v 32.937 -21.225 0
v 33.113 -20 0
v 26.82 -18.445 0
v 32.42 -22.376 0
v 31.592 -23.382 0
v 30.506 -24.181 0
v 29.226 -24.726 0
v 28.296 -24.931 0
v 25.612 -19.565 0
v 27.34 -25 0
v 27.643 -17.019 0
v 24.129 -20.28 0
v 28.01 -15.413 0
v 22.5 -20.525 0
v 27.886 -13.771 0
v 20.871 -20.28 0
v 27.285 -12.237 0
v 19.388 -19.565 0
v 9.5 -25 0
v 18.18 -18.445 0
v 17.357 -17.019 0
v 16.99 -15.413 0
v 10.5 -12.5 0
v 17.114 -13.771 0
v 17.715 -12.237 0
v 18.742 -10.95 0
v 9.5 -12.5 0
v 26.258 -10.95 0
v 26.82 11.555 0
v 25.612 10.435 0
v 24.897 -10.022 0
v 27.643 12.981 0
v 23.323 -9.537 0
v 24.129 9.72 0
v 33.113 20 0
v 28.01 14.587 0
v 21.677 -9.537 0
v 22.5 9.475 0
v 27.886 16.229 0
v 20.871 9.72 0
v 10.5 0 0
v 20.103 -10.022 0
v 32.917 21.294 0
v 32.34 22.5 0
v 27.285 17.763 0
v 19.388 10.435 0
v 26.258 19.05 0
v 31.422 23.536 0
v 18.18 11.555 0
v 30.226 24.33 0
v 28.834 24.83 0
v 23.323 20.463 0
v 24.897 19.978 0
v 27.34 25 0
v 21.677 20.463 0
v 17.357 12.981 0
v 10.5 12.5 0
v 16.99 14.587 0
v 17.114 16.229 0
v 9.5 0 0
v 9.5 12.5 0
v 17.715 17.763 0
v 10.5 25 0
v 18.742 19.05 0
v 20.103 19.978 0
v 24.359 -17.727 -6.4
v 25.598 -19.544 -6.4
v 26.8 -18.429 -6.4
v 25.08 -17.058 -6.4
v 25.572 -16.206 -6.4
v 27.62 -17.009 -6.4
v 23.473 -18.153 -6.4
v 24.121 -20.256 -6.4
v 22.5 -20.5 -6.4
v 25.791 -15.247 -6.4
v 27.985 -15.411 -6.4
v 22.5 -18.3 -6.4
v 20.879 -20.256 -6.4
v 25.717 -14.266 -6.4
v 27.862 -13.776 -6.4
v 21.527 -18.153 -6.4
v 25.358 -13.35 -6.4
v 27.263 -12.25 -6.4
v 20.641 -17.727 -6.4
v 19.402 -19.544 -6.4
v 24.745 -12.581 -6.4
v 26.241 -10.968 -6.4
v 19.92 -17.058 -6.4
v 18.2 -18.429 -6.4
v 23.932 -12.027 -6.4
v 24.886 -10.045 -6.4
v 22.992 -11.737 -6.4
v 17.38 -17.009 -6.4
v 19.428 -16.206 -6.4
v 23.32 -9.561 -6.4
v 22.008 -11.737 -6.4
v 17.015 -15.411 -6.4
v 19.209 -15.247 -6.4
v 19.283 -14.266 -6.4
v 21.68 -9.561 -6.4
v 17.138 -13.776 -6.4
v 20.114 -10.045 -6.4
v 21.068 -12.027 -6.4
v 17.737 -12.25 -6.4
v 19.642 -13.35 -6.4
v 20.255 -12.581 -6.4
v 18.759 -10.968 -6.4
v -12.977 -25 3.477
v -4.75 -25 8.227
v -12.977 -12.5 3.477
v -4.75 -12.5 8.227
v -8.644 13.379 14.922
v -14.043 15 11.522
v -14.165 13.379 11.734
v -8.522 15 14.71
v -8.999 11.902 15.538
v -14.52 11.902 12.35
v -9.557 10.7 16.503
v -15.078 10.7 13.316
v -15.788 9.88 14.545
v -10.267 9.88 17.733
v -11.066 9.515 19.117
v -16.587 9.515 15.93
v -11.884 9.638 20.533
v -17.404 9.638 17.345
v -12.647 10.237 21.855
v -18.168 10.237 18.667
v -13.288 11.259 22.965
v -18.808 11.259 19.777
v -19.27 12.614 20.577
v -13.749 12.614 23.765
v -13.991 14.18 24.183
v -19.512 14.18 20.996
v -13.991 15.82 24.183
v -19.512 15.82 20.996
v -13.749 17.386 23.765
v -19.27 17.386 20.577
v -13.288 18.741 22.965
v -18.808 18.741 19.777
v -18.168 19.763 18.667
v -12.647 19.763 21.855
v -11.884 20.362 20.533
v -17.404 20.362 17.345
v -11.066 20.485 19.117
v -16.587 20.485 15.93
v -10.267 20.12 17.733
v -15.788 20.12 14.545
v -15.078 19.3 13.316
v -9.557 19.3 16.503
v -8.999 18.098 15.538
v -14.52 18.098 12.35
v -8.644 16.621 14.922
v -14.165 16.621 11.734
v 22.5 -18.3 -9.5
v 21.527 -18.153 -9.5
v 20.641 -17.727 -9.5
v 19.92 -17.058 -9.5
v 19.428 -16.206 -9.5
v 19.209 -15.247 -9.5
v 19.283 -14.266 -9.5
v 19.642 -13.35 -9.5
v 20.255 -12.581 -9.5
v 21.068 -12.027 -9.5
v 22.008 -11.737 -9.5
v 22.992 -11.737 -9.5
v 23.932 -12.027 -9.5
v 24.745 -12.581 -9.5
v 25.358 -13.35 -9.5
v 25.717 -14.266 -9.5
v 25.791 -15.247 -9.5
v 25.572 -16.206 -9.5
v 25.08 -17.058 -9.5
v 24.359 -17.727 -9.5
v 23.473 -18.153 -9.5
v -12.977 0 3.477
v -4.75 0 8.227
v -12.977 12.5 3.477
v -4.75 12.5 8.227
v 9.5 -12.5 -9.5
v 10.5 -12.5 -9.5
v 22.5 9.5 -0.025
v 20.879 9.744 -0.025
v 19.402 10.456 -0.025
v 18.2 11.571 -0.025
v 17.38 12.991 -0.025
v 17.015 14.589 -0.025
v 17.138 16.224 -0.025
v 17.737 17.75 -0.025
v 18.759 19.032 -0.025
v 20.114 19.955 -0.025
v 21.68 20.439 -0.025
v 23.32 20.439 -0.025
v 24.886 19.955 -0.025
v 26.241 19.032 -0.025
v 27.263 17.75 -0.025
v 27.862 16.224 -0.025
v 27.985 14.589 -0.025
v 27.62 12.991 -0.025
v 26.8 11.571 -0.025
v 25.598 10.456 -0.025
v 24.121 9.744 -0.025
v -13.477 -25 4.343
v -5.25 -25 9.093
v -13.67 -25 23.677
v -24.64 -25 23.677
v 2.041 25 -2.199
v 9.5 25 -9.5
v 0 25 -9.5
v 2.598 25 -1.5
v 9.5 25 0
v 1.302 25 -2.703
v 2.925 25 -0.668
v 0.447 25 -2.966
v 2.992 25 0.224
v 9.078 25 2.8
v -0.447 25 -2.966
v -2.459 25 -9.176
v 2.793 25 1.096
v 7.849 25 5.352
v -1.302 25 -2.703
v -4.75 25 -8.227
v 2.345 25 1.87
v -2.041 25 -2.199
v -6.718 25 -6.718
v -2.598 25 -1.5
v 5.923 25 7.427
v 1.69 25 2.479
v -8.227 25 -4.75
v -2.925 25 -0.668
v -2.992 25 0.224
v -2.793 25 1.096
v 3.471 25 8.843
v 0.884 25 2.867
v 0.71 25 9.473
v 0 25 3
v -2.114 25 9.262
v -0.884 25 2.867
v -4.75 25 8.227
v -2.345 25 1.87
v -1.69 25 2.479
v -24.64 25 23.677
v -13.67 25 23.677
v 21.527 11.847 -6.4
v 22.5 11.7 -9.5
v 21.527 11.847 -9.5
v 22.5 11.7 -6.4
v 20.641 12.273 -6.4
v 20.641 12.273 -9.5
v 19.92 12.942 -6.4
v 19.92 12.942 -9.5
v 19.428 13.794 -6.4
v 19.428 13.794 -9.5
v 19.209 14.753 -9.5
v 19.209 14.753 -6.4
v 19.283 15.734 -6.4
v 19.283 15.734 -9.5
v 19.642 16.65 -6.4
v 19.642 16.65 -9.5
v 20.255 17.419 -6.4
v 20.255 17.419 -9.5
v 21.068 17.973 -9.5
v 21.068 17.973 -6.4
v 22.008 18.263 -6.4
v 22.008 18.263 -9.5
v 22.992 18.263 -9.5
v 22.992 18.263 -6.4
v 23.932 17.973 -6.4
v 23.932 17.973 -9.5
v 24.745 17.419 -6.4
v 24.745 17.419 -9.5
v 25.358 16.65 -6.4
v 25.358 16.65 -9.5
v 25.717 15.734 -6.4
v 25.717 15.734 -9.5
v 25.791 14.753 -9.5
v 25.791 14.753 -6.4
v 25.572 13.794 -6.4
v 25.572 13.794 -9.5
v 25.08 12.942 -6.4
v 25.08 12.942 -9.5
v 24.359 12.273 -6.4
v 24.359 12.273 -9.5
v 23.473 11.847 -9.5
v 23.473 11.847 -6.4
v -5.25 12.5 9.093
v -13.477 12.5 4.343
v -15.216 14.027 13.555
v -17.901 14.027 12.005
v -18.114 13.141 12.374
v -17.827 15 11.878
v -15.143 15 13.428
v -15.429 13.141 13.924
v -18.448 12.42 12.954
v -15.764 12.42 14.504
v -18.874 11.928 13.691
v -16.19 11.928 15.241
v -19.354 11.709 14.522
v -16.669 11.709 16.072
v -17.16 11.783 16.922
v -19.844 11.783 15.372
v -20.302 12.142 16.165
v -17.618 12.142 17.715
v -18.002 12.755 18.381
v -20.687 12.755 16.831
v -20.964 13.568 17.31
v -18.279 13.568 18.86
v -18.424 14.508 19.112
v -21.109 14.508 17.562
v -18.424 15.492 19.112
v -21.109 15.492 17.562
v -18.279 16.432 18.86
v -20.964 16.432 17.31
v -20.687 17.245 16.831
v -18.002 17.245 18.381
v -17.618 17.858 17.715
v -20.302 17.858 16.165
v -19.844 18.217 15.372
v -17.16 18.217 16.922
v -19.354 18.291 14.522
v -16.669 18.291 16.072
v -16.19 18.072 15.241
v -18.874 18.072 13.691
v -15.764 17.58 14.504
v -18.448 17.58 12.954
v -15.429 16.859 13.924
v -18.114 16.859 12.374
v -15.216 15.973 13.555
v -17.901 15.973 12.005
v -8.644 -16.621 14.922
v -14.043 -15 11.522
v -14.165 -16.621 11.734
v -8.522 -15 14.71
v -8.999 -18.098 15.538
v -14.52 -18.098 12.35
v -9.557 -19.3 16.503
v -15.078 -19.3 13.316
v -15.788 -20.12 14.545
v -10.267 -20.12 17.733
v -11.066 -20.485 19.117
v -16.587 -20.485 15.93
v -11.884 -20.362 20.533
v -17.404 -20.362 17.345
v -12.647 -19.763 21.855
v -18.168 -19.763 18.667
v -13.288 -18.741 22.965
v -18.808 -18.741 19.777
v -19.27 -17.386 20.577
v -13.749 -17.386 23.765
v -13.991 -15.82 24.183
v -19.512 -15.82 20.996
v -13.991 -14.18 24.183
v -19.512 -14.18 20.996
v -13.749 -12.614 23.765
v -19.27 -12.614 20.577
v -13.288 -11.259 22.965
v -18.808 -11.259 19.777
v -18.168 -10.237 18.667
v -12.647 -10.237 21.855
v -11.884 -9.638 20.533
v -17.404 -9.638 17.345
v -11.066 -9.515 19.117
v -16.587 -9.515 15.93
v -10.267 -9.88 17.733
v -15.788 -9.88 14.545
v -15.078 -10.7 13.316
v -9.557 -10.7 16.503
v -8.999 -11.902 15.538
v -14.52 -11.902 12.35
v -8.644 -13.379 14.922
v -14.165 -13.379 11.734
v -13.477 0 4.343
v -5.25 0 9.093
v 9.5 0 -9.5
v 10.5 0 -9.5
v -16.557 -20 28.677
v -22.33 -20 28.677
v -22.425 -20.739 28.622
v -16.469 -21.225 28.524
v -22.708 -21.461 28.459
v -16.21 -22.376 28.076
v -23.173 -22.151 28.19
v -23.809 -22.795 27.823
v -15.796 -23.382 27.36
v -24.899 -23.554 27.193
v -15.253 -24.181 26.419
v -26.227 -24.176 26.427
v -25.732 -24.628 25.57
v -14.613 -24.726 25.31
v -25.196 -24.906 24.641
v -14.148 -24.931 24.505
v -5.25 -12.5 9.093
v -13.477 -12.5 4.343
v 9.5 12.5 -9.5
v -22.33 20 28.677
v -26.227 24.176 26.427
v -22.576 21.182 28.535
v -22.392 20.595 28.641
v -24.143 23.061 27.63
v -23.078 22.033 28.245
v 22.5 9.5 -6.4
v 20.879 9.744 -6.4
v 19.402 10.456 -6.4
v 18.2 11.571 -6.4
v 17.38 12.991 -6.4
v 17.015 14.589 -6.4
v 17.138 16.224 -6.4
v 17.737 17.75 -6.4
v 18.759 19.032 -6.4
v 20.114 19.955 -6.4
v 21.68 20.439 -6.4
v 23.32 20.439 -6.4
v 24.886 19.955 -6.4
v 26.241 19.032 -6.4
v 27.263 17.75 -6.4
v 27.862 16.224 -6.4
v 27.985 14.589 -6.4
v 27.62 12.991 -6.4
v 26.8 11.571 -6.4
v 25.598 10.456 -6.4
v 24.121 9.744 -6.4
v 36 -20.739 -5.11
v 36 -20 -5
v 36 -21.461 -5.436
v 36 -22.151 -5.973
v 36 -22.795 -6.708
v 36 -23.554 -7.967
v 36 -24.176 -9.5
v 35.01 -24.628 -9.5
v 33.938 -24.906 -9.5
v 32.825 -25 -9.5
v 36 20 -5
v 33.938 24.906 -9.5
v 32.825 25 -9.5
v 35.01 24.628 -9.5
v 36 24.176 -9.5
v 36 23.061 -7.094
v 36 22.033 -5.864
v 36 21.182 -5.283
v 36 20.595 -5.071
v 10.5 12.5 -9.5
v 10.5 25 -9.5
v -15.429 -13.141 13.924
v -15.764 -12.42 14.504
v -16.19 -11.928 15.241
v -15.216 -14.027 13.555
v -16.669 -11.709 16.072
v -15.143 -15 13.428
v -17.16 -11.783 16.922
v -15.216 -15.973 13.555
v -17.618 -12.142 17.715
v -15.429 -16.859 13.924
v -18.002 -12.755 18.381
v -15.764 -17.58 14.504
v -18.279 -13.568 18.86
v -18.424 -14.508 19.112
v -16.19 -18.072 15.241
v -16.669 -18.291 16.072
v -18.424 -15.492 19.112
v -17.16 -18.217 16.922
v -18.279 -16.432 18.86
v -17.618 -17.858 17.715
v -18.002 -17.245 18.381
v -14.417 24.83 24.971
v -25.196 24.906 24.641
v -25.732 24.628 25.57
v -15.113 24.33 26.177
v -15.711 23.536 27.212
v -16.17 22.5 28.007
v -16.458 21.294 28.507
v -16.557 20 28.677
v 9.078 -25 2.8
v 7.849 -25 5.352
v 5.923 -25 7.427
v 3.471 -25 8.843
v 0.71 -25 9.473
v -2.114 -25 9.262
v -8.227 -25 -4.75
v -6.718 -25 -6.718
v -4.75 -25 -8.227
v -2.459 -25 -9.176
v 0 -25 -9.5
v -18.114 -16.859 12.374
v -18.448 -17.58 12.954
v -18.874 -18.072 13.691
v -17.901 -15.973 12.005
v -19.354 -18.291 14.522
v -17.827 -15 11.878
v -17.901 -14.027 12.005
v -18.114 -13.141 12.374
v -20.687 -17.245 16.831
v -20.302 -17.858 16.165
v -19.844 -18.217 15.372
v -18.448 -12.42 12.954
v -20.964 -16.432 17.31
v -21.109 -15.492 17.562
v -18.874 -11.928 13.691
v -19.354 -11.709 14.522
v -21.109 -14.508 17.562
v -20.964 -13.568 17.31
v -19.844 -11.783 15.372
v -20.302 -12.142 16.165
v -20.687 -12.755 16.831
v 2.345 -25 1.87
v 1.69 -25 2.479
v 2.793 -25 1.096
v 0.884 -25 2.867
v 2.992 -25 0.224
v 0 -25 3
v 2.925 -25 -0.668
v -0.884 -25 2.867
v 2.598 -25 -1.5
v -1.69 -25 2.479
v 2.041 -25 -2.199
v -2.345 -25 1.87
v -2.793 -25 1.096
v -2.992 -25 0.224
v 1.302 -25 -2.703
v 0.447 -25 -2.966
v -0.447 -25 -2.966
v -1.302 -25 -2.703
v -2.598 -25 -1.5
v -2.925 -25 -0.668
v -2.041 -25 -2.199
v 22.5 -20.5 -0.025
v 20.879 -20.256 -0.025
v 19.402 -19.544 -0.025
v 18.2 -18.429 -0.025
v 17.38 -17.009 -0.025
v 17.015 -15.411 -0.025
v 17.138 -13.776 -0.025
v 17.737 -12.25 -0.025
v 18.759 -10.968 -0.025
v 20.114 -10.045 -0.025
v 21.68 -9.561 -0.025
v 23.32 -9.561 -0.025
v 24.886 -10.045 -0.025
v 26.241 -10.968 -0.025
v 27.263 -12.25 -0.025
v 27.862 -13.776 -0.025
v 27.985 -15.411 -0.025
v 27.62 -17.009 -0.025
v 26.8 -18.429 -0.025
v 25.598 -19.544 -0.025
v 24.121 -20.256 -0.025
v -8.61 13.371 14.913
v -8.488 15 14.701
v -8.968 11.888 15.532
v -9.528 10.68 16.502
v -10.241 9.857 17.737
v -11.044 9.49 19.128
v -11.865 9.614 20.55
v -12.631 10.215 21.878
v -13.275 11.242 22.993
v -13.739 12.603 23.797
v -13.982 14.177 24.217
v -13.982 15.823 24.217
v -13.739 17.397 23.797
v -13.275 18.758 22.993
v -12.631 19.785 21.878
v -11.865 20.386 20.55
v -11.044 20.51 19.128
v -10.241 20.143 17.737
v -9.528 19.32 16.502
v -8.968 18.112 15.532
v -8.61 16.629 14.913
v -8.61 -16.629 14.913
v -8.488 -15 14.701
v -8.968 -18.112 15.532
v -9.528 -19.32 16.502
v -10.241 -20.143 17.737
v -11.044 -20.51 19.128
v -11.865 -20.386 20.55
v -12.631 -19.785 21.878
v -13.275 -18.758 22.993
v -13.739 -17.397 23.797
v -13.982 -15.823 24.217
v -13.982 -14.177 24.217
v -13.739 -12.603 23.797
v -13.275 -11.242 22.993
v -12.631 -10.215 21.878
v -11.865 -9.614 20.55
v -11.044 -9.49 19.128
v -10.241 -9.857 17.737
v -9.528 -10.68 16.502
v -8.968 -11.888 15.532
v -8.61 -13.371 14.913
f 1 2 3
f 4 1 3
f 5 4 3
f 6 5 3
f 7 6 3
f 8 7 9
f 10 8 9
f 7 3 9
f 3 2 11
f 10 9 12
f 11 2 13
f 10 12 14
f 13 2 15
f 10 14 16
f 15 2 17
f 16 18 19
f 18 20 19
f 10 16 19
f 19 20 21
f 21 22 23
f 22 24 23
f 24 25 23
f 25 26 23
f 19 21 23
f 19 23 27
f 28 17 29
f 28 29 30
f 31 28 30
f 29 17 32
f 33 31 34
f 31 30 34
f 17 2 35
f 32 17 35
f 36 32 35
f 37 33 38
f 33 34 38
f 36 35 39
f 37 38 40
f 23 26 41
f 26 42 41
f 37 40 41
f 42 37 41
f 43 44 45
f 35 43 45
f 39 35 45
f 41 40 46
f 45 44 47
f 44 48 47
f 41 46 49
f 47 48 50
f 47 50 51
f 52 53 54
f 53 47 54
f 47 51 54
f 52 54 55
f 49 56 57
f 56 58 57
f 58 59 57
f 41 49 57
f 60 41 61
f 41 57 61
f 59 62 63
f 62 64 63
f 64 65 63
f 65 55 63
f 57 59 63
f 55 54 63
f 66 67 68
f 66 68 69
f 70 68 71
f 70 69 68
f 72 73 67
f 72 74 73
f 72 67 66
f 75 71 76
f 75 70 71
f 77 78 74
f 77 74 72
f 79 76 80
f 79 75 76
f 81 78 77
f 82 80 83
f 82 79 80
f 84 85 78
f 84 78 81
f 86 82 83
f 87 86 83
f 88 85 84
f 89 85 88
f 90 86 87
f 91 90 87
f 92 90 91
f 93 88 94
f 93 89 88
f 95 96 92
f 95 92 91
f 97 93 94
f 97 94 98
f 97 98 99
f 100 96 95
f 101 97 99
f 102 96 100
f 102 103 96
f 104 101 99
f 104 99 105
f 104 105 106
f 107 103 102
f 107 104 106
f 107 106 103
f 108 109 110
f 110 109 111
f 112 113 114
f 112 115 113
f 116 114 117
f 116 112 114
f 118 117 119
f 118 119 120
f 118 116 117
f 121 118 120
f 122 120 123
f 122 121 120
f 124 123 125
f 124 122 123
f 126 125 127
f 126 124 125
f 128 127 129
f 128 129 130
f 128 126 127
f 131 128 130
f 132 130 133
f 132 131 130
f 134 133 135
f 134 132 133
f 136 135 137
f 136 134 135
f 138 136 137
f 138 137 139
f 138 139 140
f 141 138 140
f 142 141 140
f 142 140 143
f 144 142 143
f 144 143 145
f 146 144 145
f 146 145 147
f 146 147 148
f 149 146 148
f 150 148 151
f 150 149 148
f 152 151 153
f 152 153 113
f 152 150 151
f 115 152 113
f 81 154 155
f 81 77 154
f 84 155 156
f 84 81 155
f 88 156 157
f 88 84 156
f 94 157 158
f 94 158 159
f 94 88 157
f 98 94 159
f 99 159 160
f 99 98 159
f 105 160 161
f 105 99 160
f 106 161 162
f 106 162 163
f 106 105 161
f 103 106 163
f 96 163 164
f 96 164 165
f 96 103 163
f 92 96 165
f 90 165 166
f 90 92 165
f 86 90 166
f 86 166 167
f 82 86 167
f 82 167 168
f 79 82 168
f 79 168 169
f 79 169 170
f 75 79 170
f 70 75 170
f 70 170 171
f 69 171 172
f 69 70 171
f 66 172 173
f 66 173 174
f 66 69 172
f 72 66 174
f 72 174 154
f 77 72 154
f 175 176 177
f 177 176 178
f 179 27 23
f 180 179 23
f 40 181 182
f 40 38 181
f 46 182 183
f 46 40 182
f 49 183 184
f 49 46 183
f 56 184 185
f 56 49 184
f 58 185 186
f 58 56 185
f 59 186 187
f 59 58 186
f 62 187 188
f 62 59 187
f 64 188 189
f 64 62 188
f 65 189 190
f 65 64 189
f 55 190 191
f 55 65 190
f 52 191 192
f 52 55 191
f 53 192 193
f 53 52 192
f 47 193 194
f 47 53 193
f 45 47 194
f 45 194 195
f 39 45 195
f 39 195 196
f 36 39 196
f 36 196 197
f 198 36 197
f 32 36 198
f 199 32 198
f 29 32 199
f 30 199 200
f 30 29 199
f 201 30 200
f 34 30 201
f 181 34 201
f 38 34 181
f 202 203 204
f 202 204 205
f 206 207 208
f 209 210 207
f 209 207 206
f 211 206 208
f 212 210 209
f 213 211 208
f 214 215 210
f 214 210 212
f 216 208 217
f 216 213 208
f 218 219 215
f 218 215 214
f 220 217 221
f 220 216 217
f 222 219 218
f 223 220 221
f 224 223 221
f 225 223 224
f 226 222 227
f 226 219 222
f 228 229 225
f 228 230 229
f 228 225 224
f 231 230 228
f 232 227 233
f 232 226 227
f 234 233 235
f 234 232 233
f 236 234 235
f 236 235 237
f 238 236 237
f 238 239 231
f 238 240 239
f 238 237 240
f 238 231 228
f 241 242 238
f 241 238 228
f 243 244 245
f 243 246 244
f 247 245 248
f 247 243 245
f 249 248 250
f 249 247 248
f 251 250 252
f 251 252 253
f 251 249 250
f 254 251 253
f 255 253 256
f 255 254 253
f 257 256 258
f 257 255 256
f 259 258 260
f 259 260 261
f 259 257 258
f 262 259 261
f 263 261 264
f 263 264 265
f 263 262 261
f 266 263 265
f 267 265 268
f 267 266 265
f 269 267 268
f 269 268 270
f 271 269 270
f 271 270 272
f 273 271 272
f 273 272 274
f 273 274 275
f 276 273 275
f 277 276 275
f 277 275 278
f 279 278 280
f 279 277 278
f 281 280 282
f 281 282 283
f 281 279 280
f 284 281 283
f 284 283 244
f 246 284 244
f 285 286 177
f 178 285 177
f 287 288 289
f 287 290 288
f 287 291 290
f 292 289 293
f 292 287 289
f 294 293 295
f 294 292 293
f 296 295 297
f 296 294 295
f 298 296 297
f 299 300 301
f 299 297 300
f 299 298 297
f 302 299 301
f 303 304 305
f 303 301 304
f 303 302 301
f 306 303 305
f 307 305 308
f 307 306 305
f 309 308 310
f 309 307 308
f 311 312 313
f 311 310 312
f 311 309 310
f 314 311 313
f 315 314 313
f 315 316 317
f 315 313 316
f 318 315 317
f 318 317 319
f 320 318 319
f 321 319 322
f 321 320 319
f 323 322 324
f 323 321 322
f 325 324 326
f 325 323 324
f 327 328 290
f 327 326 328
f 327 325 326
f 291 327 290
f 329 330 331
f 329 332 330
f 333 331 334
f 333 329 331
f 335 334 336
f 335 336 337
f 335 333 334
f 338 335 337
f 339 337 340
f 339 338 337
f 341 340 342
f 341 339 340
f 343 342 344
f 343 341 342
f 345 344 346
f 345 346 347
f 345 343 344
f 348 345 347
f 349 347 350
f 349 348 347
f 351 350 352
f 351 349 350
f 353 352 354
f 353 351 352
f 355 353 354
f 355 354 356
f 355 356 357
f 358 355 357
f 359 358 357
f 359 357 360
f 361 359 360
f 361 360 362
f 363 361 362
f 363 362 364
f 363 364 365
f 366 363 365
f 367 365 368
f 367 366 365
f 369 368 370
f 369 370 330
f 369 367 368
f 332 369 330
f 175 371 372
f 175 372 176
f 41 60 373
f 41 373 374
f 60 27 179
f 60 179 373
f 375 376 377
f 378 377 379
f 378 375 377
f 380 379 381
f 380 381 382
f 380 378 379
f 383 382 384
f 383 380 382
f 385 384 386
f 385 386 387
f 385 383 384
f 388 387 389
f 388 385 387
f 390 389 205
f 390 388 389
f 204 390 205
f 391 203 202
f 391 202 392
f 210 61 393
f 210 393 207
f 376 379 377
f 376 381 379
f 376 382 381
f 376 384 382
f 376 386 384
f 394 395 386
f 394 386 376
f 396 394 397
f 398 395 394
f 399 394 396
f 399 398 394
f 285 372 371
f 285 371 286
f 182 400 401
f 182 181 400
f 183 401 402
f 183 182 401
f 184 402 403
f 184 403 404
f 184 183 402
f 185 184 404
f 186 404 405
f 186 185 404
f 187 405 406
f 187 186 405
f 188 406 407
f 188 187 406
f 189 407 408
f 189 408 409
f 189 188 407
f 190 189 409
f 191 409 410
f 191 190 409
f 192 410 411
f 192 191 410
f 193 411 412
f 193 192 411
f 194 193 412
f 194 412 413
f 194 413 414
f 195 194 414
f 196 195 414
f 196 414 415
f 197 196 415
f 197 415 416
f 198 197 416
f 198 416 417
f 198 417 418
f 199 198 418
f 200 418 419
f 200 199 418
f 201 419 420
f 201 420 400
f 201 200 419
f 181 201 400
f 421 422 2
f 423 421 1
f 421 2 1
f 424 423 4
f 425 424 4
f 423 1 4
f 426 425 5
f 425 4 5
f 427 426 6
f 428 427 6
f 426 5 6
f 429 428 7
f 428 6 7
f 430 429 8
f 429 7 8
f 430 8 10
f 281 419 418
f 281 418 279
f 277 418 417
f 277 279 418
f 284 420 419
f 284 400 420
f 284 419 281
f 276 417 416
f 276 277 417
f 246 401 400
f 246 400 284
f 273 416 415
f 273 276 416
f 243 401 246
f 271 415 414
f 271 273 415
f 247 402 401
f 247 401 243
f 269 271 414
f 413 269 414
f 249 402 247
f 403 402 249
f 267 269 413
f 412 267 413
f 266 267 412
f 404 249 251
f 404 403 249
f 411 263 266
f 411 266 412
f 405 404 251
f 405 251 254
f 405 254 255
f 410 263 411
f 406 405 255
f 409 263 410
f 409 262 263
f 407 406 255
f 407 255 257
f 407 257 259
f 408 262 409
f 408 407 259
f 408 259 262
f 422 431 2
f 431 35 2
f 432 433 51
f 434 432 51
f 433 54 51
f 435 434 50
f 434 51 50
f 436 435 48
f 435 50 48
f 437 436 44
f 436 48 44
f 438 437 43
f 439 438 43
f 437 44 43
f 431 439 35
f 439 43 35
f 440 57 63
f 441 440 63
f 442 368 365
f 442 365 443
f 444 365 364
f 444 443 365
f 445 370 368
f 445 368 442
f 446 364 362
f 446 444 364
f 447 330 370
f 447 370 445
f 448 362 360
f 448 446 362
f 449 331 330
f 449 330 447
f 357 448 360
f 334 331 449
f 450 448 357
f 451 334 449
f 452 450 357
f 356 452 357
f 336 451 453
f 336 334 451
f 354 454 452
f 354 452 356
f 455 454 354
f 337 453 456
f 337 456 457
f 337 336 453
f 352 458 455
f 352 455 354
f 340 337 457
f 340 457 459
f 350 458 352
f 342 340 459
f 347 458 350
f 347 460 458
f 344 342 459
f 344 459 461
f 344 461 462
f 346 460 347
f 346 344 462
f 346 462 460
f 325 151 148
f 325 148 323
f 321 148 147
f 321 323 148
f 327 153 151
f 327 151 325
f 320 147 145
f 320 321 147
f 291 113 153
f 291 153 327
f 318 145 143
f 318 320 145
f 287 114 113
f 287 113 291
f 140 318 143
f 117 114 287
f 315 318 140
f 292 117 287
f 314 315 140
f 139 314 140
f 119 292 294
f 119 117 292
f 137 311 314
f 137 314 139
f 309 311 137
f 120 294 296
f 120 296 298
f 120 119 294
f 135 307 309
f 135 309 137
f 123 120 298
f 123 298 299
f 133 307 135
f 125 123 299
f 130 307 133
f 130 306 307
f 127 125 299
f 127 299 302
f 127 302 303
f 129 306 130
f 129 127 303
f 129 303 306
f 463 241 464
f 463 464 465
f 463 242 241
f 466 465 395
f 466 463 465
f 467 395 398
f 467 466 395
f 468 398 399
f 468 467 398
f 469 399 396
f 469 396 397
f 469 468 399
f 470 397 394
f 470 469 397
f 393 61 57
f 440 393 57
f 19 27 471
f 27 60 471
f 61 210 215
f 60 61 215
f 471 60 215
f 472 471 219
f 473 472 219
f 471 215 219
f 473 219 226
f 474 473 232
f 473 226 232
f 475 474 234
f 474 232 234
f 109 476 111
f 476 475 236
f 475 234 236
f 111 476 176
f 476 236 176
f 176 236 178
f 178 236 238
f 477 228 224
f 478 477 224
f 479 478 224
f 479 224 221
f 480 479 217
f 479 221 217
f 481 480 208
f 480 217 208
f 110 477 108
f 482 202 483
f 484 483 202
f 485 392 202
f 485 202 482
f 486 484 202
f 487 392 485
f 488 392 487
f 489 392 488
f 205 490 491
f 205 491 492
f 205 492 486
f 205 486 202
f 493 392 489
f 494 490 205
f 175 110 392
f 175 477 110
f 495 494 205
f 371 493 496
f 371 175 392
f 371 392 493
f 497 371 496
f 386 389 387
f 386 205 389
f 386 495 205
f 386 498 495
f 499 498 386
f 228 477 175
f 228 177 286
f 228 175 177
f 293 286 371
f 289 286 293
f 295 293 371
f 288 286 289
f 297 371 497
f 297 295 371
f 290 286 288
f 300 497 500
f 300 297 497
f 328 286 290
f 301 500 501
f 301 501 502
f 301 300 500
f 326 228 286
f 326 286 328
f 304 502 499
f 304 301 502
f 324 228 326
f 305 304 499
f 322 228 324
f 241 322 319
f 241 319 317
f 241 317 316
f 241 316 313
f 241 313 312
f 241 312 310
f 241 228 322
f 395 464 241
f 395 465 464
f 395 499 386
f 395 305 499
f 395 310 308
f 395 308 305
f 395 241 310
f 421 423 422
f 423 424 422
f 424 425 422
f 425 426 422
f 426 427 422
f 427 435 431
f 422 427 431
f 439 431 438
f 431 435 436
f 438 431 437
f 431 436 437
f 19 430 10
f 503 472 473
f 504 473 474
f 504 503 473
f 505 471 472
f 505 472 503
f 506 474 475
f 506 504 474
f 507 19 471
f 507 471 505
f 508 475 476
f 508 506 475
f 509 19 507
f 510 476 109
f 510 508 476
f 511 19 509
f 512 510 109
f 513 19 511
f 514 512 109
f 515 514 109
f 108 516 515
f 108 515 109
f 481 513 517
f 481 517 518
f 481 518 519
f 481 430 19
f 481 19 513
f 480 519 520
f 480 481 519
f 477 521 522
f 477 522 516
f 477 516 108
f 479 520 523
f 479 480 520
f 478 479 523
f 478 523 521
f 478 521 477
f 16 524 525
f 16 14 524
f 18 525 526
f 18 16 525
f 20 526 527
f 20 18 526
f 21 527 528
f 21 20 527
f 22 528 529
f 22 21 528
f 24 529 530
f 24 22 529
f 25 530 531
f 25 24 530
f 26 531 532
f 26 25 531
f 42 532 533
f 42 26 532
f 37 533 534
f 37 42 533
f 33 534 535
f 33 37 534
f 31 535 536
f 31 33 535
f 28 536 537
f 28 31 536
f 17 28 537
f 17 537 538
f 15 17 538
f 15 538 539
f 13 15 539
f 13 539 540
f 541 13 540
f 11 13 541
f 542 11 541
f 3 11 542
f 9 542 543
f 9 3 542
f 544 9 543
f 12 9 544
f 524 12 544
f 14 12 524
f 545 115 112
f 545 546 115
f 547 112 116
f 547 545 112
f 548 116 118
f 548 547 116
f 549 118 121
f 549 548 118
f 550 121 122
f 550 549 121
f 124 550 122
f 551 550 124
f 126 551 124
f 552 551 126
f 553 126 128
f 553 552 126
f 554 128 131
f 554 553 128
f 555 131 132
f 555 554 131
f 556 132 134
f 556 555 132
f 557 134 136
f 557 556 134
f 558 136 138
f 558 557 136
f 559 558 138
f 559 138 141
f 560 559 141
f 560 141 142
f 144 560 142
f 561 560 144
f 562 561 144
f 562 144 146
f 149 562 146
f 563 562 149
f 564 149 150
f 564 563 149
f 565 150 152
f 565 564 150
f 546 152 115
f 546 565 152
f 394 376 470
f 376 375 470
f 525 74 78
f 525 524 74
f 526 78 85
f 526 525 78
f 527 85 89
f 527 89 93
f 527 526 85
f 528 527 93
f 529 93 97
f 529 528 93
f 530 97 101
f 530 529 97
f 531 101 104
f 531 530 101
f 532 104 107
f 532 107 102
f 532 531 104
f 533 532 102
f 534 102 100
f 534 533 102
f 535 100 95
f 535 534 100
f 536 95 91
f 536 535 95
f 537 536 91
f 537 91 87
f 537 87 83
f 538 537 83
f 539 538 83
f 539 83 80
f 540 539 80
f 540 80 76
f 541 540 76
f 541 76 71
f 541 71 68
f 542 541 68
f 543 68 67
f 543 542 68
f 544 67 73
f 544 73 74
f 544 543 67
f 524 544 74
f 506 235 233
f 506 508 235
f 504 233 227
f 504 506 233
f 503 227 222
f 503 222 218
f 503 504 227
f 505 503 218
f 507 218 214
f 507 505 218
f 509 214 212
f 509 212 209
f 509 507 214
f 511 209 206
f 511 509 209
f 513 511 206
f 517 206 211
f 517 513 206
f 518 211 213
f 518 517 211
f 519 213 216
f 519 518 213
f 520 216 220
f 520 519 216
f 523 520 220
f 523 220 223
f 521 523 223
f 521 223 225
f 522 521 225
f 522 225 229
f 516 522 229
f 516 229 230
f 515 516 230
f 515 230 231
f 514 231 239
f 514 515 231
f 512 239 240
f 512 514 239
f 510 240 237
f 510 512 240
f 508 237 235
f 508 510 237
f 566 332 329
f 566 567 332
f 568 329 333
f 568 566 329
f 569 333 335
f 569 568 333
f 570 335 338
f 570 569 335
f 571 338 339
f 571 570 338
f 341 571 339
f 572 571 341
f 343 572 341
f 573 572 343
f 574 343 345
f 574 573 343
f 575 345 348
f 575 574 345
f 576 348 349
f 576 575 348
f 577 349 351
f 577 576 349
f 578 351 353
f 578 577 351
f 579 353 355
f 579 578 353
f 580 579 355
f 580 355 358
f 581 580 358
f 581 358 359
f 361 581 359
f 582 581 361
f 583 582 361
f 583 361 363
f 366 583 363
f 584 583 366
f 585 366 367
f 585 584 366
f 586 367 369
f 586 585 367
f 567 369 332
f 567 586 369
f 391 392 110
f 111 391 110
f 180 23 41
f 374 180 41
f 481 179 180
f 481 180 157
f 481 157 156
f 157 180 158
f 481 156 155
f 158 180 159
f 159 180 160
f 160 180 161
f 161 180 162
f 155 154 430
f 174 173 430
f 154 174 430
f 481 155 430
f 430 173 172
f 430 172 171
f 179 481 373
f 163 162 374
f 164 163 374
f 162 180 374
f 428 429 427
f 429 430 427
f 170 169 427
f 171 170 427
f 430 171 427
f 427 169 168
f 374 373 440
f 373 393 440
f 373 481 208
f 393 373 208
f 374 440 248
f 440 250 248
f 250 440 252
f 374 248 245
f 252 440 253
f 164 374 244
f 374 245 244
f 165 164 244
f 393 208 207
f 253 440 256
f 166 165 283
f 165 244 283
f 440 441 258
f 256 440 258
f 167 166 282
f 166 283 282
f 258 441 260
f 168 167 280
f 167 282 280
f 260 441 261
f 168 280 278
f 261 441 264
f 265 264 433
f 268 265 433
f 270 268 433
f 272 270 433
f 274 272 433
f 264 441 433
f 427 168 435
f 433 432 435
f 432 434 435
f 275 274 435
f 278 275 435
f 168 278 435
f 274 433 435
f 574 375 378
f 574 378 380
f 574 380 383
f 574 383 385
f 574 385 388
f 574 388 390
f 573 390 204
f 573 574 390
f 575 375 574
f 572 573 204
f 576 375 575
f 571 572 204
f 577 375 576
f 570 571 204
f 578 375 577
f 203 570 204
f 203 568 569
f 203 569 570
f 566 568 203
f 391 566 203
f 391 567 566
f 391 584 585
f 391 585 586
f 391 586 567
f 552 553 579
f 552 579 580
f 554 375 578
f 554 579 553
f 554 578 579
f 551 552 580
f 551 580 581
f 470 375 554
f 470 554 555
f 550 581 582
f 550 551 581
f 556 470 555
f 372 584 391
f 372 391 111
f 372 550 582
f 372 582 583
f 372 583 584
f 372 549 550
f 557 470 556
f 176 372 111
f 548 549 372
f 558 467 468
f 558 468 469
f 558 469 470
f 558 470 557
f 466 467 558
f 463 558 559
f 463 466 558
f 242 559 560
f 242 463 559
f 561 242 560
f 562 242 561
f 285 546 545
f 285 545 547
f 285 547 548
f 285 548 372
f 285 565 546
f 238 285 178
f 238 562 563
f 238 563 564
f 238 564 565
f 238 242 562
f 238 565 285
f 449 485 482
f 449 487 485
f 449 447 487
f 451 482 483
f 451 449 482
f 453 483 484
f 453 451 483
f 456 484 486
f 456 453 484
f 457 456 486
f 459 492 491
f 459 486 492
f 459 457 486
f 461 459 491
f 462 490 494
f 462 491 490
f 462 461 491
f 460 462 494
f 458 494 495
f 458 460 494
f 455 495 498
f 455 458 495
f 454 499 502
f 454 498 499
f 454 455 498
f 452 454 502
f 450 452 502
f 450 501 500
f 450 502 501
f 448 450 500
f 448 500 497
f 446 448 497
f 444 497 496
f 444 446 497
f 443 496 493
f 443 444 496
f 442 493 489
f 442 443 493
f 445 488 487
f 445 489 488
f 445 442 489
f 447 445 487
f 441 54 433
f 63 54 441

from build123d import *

# Parameters (mm, degrees)
SKETCH_9_R                  = 3
EXTRUDE_4_DEPTH             = 25
EXTRUDE_4_DEPTH_BACK        = 25
EXTRUDE_5_REACH             = 27
SKETCH_10_R                 = 3
EXTRUDE_5_DIRECTION_2_REACH = 27
HOLE_WIZARD_M61_AT_2_COUNT  = 2
HOLE_WIZARD_M61_AT_2_PITCH  = 30
HOLE_WIZARD_M62_AT_2_COUNT  = 2
HOLE_WIZARD_M62_AT_2_PITCH  = 30
CHAMFER_1_SIZE              = 5
CHAMFER_1_SIZE2             = 2.886751346
CHAMFER_1_PART_2_SIZE       = 5
CHAMFER_1_PART_2_SIZE2      = 2.886751346
SKETCH_15_W                 = 1
SKETCH_15_H                 = 12.5
CUT_EXTRUDE_1_DEPTH         = 10.5
SKETCH_16_W                 = 1
SKETCH_16_H                 = 12.5
CUT_EXTRUDE_2_DEPTH         = 28.463457268
FILLET_2_R                  = 5


with BuildPart() as part:
    # Sketch 9 → Extrude 4 (new body, two sides)
    with BuildSketch(Plane(origin=(0, 0, 0), x_dir=(1, 0, 0), z_dir=(0, 1, 0))) as extrude_4_sk:
        with BuildLine():
            Line((0, 9.5), (36, 9.5))
            Line((36, 9.5), (36, 0))
            Line((36, 0), (9.5, 0))
            ThreePointArc((9.5, 0), (-6.717514421, -6.717514421), (0, 9.5))
        make_face()
        with Locations(Location((0, 0, 0), (0, 0, 270))):  # turned: the seam where the file's is
            Circle(SKETCH_9_R, mode=Mode.SUBTRACT)
    extrude(amount=EXTRUDE_4_DEPTH)
    extrude(extrude_4_sk.sketch, amount=-EXTRUDE_4_DEPTH_BACK)

    # Extrude 5: up to this face of the body (flat: up to its plane)
    extrude_5_end = Plane(part.part.faces().sort_by_distance((11.152200141, 25, -2.543273154))[0])
    # Sketch 10 → Extrude 5 (add, up to the picked face)
    with BuildSketch(Plane(origin=(0, 0, 0), x_dir=(1, 0, 0), z_dir=(0, 1, 0)), mode=Mode.PRIVATE) as extrude_5_sk1:
        with BuildLine():
            Line((-8.227241336, 4.75), (-26.227241336, -26.426914536))
            Line((-26.227241336, -26.426914536), (-18, -31.176914536))
            Line((-18, -31.176914536), (-4.75, -8.227241336))
            ThreePointArc((-4.75, -8.227241336), (9.17629535, 2.458780928), (-8.227241336, 4.75))
        make_face()
        with Locations(Location((0, 0, 0), (0, 0, 270))):  # turned: the seam where the file's is
            Circle(SKETCH_10_R, mode=Mode.SUBTRACT)
    extrude_5_tool1 = split(extrude(extrude_5_sk1.sketch, amount=EXTRUDE_5_REACH, mode=Mode.PRIVATE), bisect_by=extrude_5_end, keep=Keep.BOTH, mode=Mode.PRIVATE)
    add(extrude_5_tool1.solids().sort_by(Axis((-7.778639, 0, 8.386452), (0, 1, 0)))[0])

    # Extrude 5 direction 2: up to this face of the body (flat: up to its plane)
    extrude_5_direction_2_end = Plane(part.part.faces().sort_by_distance((11.152200141, -25, -2.543273154))[0])
    # Sketch 10 → Extrude 5 direction 2 (add, up to the picked face)
    with BuildSketch(Plane(origin=(0, 0, 0), x_dir=(1, 0, 0), z_dir=(0, 1, 0)), mode=Mode.PRIVATE) as extrude_5_direction_2_sk1:
        with BuildLine():
            Line((-8.227241336, 4.75), (-26.227241336, -26.426914536))
            Line((-26.227241336, -26.426914536), (-18, -31.176914536))
            Line((-18, -31.176914536), (-4.75, -8.227241336))
            ThreePointArc((-4.75, -8.227241336), (9.17629535, 2.458780928), (-8.227241336, 4.75))
        make_face()
        with Locations(Location((0, 0, 0), (0, 0, 270))):  # turned: the seam where the file's is
            Circle(SKETCH_10_R, mode=Mode.SUBTRACT)
    extrude_5_direction_2_tool1 = split(extrude(extrude_5_direction_2_sk1.sketch, amount=-EXTRUDE_5_DIRECTION_2_REACH, mode=Mode.PRIVATE), bisect_by=extrude_5_direction_2_end, keep=Keep.BOTH, mode=Mode.PRIVATE)
    add(extrude_5_direction_2_tool1.solids().sort_by(Axis((-7.778639, 0, 8.386452), (0, -1, 0)))[0])

    # Sketch 12 → Hole Wizard M61 (revolve, cut)
    with BuildSketch(Plane(origin=(22.5, 15, 0), x_dir=(0, -1, 0), z_dir=(1, 0, 0))):
        Polygon((0, 0), (0, 9.5), (3.3, 9.5), (3.3, 6.4), (5.5, 6.4), (5.5, 0.025), (5.525, 0), align=None)
    hole_wizard_m61 = revolve(axis=Axis((22.5, 15, 6.35), (0, 0, -1)), mode=Mode.SUBTRACT)

    # Hole Wizard M61 at 2: Hole Wizard M61 ×2
    with Locations(*[(0, -i * HOLE_WIZARD_M61_AT_2_PITCH, 0) for i in range(1, HOLE_WIZARD_M61_AT_2_COUNT)]):
        add(hole_wizard_m61, mode=Mode.SUBTRACT)

    # Sketch 14 → Hole Wizard M62 (revolve, cut)
    with BuildSketch(Plane(origin=(-11.25, 15, 19.485571585), x_dir=(0.5, 0, -0.866025404), z_dir=(0, 1, 0))):
        Polygon((0, 0), (0, 27.463457268), (3.3, 27.463457268), (3.3, 6.4), (5.5, 6.4), (5.5, 0.025), (5.525, 0), align=None)
    hole_wizard_m62 = revolve(axis=Axis((-5.750738686, 15, 22.660571585), (-0.866025404, 0, -0.5)), mode=Mode.SUBTRACT)

    # Hole Wizard M62 at 2: Hole Wizard M62 ×2
    with Locations(*[(0, -i * HOLE_WIZARD_M62_AT_2_PITCH, 0) for i in range(1, HOLE_WIZARD_M62_AT_2_COUNT)]):
        add(hole_wizard_m62, mode=Mode.SUBTRACT)

    # Chamfer 1
    chamfer_1_edges = [part.edges().sort_by_distance(p)[0] for p in [
        (-18, 0, 31.176914536),
    ]]
    chamfer_1_side = [part.faces().sort_by_distance(p)[0] for p in [
        (-22.113620668, 0, 28.801914536),
    ]]
    chamfer(chamfer_1_edges, length=CHAMFER_1_SIZE, length2=CHAMFER_1_SIZE2, reference=chamfer_1_side[0])

    # Chamfer 1 part 2
    chamfer_1_part_2_edges = [part.edges().sort_by_distance(p)[0] for p in [
        (36, 0, 0),
    ]]
    chamfer_1_part_2_side = [part.faces().sort_by_distance(p)[0] for p in [
        (36, 0, -4.75),
    ]]
    chamfer(chamfer_1_part_2_edges, length=CHAMFER_1_PART_2_SIZE, length2=CHAMFER_1_PART_2_SIZE2, reference=chamfer_1_part_2_side[0])

    # Sketch 15 → Cut-Extrude 1 (cut, through all)
    with BuildSketch(Plane.XY):
        with Locations((10, 18.75)):
            Rectangle(SKETCH_15_W, SKETCH_15_H)
        with Locations((10, -6.25)):
            Rectangle(SKETCH_15_W, SKETCH_15_H)
    extrude(amount=-CUT_EXTRUDE_1_DEPTH, mode=Mode.SUBTRACT)

    # Sketch 16 → Cut-Extrude 2 (cut, through all)
    with BuildSketch(Plane(origin=(0, 0, 0), x_dir=(0.5, 0, -0.866025404), z_dir=(0.866025404, 0, 0.5))):
        with Locations((-10, -18.75)):
            Rectangle(SKETCH_16_W, SKETCH_16_H)
        with Locations((-10, 6.25)):
            Rectangle(SKETCH_16_W, SKETCH_16_H)
    extrude(amount=-CUT_EXTRUDE_2_DEPTH, mode=Mode.SUBTRACT)

    # Fillet 2
    fillet_2_edges = [part.edges().sort_by_distance(p)[0] for p in [
        (34.556624327, 25, -2.5),
        (34.556624327, -25, -2.5),
        (-19.443375673, 25, 28.676914536),
        (-19.443375673, -25, 28.676914536),
    ]]
    fillet(fillet_2_edges, radius=FILLET_2_R)


solid = part.part
